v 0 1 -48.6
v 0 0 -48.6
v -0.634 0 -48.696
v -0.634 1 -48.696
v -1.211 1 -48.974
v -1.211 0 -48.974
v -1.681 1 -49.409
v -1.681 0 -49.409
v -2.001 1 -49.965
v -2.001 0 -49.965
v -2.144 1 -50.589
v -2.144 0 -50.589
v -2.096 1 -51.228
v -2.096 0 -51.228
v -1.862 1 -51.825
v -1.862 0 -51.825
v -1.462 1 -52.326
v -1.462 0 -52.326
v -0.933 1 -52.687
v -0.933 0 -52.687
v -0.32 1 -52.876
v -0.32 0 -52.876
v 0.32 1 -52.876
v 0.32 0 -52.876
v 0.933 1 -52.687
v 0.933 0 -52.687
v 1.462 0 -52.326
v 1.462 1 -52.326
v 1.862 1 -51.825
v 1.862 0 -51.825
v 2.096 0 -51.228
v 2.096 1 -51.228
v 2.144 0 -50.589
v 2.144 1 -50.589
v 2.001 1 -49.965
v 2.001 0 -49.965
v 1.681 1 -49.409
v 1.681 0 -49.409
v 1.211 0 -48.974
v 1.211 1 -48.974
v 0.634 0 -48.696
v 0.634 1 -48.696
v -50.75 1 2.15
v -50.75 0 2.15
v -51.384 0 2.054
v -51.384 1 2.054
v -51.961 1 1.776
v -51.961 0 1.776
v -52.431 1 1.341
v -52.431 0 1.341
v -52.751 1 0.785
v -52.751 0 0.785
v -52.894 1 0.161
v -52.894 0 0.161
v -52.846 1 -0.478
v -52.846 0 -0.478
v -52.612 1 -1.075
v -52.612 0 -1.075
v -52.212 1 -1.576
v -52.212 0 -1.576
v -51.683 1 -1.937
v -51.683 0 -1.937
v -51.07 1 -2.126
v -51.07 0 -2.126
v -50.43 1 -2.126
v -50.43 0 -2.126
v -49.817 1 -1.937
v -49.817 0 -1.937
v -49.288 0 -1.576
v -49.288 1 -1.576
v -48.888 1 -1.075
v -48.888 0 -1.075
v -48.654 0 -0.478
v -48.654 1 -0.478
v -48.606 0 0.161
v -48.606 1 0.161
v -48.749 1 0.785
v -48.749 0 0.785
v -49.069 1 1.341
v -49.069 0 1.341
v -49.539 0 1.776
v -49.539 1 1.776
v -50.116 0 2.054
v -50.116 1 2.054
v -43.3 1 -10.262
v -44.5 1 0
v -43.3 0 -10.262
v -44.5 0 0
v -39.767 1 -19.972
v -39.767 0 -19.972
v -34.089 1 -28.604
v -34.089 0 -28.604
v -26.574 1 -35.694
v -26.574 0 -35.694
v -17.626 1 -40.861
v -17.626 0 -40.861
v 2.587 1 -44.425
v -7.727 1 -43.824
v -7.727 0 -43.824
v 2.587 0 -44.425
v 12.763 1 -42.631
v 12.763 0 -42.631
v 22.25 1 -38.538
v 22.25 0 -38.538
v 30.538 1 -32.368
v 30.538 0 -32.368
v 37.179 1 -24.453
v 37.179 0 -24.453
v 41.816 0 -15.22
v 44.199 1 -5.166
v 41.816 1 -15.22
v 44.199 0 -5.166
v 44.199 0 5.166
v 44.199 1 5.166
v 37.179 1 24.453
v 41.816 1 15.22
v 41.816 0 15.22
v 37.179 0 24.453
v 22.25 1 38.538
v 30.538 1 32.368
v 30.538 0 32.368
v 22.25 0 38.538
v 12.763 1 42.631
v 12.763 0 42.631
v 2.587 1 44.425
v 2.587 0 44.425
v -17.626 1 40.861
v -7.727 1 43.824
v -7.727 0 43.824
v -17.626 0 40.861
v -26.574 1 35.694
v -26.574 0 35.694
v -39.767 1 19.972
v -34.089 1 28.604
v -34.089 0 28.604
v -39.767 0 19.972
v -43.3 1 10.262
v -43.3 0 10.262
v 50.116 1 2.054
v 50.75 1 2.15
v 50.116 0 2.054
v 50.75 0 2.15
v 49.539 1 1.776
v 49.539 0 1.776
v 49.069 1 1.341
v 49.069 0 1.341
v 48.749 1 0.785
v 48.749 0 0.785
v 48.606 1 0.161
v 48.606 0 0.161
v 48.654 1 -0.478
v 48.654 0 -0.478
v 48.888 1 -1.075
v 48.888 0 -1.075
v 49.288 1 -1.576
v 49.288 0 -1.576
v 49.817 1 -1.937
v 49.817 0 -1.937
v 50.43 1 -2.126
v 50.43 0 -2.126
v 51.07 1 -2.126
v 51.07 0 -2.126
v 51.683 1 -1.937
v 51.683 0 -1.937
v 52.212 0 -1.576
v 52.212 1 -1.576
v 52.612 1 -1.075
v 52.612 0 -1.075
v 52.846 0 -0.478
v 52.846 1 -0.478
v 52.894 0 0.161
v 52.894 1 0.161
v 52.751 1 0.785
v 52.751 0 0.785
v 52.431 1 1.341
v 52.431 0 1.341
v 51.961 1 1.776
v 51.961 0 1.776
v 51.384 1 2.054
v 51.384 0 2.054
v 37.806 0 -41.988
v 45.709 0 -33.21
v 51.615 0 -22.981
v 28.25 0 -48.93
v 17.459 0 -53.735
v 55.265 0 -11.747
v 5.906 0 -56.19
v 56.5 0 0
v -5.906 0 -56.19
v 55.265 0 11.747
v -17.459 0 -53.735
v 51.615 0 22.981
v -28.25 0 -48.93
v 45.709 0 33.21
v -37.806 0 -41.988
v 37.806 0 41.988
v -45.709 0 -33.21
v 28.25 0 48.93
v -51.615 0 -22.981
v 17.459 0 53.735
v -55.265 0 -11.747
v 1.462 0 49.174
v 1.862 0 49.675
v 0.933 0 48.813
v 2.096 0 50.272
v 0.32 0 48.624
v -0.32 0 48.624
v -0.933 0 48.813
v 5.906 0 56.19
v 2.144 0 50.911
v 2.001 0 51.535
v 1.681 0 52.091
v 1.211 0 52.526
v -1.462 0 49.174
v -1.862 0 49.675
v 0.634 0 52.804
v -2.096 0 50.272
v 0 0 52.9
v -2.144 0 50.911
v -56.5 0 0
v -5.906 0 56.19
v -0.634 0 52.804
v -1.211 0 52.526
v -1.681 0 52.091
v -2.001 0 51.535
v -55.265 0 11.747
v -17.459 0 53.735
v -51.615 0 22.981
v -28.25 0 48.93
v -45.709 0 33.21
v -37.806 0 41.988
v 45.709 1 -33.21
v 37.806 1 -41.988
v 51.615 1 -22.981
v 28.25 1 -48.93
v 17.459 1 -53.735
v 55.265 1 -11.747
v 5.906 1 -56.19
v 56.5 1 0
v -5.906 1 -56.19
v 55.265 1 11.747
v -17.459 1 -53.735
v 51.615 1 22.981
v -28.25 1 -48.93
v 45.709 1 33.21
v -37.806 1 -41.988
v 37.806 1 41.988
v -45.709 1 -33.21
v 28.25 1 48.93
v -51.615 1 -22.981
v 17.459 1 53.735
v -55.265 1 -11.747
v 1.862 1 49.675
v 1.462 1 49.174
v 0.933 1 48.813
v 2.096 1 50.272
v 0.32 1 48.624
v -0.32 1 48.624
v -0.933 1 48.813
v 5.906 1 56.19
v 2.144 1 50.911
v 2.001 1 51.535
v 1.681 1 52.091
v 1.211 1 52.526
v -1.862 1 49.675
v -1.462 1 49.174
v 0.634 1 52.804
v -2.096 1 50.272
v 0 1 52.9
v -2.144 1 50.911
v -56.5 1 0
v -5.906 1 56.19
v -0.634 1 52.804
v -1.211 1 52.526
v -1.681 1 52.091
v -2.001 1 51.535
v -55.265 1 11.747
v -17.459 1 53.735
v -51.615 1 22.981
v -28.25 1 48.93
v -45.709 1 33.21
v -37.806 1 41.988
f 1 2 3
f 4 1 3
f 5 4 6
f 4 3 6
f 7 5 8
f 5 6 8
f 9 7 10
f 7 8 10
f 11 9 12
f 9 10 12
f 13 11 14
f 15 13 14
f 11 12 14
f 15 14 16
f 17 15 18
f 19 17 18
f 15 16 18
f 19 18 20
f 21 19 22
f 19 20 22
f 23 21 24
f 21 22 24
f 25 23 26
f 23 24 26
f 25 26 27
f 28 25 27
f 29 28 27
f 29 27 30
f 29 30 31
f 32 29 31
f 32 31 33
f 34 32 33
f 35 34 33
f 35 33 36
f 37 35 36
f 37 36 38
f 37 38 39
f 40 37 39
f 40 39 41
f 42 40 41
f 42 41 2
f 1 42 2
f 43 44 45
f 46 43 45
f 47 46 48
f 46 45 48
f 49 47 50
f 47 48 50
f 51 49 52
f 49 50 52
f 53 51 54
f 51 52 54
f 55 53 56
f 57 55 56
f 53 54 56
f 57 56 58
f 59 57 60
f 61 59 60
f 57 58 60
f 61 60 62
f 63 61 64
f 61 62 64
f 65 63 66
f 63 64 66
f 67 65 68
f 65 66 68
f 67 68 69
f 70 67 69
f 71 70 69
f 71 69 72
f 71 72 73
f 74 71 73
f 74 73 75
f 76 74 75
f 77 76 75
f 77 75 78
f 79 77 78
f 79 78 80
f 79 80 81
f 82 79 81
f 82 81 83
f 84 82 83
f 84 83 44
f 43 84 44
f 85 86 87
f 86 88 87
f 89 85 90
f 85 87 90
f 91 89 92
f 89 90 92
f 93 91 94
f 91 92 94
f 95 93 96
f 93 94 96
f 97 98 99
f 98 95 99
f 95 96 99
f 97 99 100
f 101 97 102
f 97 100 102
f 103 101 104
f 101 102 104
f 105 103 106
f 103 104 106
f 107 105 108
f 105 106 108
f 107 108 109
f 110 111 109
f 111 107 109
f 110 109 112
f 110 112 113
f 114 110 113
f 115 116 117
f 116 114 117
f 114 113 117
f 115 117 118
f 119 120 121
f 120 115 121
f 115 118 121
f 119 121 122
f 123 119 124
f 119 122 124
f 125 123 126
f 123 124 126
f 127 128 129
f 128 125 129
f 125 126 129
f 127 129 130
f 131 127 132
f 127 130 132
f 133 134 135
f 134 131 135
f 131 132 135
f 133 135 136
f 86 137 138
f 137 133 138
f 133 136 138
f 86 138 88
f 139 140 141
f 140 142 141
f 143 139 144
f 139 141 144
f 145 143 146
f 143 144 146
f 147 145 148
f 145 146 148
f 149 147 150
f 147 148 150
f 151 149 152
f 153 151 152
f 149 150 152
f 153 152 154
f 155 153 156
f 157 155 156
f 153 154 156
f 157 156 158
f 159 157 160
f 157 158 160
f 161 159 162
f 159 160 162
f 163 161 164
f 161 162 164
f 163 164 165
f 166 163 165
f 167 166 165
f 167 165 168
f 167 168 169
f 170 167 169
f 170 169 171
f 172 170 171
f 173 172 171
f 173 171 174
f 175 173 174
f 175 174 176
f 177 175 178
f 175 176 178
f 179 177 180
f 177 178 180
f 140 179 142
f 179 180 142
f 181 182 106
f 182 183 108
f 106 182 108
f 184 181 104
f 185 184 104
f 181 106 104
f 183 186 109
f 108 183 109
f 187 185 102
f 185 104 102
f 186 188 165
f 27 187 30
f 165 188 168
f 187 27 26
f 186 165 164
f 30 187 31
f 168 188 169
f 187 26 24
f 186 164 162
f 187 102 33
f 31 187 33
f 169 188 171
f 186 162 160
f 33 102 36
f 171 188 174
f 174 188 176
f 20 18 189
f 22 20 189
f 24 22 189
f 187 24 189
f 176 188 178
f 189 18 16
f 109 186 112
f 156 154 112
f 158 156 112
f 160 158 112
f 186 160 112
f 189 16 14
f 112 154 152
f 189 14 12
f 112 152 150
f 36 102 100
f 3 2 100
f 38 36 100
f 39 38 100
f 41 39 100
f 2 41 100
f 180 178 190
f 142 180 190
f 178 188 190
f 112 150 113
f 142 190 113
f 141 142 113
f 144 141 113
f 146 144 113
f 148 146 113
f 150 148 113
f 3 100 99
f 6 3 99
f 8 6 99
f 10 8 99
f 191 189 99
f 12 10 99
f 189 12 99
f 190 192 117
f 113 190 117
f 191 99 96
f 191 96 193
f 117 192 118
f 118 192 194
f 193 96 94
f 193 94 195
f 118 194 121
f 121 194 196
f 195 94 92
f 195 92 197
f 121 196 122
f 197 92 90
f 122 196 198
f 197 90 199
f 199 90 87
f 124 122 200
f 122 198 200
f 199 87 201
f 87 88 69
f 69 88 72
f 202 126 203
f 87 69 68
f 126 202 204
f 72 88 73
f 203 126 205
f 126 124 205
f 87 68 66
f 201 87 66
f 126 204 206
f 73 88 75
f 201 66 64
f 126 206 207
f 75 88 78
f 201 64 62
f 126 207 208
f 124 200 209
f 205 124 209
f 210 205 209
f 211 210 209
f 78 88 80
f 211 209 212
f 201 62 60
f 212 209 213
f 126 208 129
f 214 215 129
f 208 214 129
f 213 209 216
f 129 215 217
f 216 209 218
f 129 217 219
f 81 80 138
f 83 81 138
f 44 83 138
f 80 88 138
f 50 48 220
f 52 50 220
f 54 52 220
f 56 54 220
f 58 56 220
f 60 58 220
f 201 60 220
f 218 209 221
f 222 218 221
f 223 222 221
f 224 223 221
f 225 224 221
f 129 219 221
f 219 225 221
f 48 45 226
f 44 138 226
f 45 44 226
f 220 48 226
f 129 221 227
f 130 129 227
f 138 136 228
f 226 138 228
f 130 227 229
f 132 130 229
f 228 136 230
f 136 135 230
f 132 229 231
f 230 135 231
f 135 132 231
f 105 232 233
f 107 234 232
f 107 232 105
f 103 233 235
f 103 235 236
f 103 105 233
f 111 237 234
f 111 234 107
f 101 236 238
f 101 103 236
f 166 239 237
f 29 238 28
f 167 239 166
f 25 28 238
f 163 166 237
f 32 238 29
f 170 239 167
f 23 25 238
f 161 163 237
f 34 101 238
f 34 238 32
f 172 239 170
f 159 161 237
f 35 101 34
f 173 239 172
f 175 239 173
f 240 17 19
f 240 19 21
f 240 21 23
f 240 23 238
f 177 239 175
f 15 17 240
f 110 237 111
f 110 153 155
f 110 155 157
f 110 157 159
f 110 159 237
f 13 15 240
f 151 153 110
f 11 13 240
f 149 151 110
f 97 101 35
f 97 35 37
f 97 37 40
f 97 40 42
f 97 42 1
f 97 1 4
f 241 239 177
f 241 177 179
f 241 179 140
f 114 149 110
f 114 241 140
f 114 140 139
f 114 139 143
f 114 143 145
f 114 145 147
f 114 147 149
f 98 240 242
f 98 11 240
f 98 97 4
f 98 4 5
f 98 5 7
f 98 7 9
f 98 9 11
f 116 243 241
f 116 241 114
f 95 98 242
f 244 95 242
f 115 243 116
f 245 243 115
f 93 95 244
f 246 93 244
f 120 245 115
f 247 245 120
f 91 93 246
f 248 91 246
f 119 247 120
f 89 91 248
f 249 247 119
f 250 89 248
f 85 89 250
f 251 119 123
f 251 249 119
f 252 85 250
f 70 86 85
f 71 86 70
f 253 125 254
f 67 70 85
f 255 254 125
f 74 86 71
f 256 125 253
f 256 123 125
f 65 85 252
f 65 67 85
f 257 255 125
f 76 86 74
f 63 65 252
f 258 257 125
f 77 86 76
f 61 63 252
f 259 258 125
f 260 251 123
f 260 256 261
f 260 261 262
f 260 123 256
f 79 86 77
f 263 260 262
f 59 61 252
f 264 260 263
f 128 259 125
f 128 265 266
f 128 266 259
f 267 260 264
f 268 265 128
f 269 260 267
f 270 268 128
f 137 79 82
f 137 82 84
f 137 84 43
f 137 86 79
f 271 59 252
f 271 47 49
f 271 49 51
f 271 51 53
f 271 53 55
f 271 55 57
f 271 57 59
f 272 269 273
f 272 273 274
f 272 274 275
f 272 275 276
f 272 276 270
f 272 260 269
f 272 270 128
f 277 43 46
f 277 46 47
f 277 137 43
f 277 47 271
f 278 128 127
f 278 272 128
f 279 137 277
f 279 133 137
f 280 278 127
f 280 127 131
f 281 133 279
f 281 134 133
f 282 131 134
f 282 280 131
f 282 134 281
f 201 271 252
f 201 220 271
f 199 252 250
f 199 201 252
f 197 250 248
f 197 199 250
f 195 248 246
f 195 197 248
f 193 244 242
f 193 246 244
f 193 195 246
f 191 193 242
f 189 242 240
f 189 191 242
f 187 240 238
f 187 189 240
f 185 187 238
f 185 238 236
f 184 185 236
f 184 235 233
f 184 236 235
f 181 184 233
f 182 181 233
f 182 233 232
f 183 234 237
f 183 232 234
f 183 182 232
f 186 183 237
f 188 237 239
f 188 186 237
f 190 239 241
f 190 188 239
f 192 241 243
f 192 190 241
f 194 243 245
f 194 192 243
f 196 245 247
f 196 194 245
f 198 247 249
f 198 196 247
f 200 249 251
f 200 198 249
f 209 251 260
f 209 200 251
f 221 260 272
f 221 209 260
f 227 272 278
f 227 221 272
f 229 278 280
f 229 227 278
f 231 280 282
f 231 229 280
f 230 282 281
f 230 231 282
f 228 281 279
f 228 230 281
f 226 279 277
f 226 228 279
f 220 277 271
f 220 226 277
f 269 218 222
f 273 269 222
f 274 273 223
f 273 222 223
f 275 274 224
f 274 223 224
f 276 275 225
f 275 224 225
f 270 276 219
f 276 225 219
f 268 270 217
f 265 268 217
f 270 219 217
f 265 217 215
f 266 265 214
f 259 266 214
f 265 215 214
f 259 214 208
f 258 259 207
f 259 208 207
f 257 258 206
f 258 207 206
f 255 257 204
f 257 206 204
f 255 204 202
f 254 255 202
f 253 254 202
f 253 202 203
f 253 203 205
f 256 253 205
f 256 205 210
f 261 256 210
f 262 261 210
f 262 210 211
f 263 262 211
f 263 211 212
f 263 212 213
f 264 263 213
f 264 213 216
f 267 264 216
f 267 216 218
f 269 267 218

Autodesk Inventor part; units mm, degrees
ref_plane "YZ Plane" through (0, 0, 0) normal (1, 0, 0) x (0, 1, 0)
ref_plane "XZ Plane" through (0, 0, 0) normal (0, 1, 0) x (-1, 0, 0)
ref_plane "XY Plane" through (0, 0, 0) normal (0, 0, 1) x (1, 0, 0)
sketch "スケッチ1" plane through (0, 0, 0) normal (0, 1, 0) x (-1, 0, 0)
  circle A0 centre (0, 0) radius 56.5
  circle A1 centre (0, 0) radius 44.5
  dimension "d0" = 113
  dimension "d1" = 89
extrude "押し出し1" add sketch "スケッチ1" along normal blind 1
sketch "スケッチ2" plane through (0, 1, 0) normal (0, 1, 0) x (1, 0, 0)
  circle A0 centre (0, 0) radius 50.75
  point P0 (-50.75, 0)
  point P1 (0, -50.75)
  point P2 (50.75, 0)
  point P3 (0, 50.75)
  dimension "d4" = 101.5
  dimension "d7" = 360
hole "穴1" at (-50.75, 1, 0) at (0, 1, 50.75) at (50.75, 1, 0) at (0, 1, -50.75) direction (0, -1, 0) diameter 4.3 end through all
properties part number "basespacer1"
